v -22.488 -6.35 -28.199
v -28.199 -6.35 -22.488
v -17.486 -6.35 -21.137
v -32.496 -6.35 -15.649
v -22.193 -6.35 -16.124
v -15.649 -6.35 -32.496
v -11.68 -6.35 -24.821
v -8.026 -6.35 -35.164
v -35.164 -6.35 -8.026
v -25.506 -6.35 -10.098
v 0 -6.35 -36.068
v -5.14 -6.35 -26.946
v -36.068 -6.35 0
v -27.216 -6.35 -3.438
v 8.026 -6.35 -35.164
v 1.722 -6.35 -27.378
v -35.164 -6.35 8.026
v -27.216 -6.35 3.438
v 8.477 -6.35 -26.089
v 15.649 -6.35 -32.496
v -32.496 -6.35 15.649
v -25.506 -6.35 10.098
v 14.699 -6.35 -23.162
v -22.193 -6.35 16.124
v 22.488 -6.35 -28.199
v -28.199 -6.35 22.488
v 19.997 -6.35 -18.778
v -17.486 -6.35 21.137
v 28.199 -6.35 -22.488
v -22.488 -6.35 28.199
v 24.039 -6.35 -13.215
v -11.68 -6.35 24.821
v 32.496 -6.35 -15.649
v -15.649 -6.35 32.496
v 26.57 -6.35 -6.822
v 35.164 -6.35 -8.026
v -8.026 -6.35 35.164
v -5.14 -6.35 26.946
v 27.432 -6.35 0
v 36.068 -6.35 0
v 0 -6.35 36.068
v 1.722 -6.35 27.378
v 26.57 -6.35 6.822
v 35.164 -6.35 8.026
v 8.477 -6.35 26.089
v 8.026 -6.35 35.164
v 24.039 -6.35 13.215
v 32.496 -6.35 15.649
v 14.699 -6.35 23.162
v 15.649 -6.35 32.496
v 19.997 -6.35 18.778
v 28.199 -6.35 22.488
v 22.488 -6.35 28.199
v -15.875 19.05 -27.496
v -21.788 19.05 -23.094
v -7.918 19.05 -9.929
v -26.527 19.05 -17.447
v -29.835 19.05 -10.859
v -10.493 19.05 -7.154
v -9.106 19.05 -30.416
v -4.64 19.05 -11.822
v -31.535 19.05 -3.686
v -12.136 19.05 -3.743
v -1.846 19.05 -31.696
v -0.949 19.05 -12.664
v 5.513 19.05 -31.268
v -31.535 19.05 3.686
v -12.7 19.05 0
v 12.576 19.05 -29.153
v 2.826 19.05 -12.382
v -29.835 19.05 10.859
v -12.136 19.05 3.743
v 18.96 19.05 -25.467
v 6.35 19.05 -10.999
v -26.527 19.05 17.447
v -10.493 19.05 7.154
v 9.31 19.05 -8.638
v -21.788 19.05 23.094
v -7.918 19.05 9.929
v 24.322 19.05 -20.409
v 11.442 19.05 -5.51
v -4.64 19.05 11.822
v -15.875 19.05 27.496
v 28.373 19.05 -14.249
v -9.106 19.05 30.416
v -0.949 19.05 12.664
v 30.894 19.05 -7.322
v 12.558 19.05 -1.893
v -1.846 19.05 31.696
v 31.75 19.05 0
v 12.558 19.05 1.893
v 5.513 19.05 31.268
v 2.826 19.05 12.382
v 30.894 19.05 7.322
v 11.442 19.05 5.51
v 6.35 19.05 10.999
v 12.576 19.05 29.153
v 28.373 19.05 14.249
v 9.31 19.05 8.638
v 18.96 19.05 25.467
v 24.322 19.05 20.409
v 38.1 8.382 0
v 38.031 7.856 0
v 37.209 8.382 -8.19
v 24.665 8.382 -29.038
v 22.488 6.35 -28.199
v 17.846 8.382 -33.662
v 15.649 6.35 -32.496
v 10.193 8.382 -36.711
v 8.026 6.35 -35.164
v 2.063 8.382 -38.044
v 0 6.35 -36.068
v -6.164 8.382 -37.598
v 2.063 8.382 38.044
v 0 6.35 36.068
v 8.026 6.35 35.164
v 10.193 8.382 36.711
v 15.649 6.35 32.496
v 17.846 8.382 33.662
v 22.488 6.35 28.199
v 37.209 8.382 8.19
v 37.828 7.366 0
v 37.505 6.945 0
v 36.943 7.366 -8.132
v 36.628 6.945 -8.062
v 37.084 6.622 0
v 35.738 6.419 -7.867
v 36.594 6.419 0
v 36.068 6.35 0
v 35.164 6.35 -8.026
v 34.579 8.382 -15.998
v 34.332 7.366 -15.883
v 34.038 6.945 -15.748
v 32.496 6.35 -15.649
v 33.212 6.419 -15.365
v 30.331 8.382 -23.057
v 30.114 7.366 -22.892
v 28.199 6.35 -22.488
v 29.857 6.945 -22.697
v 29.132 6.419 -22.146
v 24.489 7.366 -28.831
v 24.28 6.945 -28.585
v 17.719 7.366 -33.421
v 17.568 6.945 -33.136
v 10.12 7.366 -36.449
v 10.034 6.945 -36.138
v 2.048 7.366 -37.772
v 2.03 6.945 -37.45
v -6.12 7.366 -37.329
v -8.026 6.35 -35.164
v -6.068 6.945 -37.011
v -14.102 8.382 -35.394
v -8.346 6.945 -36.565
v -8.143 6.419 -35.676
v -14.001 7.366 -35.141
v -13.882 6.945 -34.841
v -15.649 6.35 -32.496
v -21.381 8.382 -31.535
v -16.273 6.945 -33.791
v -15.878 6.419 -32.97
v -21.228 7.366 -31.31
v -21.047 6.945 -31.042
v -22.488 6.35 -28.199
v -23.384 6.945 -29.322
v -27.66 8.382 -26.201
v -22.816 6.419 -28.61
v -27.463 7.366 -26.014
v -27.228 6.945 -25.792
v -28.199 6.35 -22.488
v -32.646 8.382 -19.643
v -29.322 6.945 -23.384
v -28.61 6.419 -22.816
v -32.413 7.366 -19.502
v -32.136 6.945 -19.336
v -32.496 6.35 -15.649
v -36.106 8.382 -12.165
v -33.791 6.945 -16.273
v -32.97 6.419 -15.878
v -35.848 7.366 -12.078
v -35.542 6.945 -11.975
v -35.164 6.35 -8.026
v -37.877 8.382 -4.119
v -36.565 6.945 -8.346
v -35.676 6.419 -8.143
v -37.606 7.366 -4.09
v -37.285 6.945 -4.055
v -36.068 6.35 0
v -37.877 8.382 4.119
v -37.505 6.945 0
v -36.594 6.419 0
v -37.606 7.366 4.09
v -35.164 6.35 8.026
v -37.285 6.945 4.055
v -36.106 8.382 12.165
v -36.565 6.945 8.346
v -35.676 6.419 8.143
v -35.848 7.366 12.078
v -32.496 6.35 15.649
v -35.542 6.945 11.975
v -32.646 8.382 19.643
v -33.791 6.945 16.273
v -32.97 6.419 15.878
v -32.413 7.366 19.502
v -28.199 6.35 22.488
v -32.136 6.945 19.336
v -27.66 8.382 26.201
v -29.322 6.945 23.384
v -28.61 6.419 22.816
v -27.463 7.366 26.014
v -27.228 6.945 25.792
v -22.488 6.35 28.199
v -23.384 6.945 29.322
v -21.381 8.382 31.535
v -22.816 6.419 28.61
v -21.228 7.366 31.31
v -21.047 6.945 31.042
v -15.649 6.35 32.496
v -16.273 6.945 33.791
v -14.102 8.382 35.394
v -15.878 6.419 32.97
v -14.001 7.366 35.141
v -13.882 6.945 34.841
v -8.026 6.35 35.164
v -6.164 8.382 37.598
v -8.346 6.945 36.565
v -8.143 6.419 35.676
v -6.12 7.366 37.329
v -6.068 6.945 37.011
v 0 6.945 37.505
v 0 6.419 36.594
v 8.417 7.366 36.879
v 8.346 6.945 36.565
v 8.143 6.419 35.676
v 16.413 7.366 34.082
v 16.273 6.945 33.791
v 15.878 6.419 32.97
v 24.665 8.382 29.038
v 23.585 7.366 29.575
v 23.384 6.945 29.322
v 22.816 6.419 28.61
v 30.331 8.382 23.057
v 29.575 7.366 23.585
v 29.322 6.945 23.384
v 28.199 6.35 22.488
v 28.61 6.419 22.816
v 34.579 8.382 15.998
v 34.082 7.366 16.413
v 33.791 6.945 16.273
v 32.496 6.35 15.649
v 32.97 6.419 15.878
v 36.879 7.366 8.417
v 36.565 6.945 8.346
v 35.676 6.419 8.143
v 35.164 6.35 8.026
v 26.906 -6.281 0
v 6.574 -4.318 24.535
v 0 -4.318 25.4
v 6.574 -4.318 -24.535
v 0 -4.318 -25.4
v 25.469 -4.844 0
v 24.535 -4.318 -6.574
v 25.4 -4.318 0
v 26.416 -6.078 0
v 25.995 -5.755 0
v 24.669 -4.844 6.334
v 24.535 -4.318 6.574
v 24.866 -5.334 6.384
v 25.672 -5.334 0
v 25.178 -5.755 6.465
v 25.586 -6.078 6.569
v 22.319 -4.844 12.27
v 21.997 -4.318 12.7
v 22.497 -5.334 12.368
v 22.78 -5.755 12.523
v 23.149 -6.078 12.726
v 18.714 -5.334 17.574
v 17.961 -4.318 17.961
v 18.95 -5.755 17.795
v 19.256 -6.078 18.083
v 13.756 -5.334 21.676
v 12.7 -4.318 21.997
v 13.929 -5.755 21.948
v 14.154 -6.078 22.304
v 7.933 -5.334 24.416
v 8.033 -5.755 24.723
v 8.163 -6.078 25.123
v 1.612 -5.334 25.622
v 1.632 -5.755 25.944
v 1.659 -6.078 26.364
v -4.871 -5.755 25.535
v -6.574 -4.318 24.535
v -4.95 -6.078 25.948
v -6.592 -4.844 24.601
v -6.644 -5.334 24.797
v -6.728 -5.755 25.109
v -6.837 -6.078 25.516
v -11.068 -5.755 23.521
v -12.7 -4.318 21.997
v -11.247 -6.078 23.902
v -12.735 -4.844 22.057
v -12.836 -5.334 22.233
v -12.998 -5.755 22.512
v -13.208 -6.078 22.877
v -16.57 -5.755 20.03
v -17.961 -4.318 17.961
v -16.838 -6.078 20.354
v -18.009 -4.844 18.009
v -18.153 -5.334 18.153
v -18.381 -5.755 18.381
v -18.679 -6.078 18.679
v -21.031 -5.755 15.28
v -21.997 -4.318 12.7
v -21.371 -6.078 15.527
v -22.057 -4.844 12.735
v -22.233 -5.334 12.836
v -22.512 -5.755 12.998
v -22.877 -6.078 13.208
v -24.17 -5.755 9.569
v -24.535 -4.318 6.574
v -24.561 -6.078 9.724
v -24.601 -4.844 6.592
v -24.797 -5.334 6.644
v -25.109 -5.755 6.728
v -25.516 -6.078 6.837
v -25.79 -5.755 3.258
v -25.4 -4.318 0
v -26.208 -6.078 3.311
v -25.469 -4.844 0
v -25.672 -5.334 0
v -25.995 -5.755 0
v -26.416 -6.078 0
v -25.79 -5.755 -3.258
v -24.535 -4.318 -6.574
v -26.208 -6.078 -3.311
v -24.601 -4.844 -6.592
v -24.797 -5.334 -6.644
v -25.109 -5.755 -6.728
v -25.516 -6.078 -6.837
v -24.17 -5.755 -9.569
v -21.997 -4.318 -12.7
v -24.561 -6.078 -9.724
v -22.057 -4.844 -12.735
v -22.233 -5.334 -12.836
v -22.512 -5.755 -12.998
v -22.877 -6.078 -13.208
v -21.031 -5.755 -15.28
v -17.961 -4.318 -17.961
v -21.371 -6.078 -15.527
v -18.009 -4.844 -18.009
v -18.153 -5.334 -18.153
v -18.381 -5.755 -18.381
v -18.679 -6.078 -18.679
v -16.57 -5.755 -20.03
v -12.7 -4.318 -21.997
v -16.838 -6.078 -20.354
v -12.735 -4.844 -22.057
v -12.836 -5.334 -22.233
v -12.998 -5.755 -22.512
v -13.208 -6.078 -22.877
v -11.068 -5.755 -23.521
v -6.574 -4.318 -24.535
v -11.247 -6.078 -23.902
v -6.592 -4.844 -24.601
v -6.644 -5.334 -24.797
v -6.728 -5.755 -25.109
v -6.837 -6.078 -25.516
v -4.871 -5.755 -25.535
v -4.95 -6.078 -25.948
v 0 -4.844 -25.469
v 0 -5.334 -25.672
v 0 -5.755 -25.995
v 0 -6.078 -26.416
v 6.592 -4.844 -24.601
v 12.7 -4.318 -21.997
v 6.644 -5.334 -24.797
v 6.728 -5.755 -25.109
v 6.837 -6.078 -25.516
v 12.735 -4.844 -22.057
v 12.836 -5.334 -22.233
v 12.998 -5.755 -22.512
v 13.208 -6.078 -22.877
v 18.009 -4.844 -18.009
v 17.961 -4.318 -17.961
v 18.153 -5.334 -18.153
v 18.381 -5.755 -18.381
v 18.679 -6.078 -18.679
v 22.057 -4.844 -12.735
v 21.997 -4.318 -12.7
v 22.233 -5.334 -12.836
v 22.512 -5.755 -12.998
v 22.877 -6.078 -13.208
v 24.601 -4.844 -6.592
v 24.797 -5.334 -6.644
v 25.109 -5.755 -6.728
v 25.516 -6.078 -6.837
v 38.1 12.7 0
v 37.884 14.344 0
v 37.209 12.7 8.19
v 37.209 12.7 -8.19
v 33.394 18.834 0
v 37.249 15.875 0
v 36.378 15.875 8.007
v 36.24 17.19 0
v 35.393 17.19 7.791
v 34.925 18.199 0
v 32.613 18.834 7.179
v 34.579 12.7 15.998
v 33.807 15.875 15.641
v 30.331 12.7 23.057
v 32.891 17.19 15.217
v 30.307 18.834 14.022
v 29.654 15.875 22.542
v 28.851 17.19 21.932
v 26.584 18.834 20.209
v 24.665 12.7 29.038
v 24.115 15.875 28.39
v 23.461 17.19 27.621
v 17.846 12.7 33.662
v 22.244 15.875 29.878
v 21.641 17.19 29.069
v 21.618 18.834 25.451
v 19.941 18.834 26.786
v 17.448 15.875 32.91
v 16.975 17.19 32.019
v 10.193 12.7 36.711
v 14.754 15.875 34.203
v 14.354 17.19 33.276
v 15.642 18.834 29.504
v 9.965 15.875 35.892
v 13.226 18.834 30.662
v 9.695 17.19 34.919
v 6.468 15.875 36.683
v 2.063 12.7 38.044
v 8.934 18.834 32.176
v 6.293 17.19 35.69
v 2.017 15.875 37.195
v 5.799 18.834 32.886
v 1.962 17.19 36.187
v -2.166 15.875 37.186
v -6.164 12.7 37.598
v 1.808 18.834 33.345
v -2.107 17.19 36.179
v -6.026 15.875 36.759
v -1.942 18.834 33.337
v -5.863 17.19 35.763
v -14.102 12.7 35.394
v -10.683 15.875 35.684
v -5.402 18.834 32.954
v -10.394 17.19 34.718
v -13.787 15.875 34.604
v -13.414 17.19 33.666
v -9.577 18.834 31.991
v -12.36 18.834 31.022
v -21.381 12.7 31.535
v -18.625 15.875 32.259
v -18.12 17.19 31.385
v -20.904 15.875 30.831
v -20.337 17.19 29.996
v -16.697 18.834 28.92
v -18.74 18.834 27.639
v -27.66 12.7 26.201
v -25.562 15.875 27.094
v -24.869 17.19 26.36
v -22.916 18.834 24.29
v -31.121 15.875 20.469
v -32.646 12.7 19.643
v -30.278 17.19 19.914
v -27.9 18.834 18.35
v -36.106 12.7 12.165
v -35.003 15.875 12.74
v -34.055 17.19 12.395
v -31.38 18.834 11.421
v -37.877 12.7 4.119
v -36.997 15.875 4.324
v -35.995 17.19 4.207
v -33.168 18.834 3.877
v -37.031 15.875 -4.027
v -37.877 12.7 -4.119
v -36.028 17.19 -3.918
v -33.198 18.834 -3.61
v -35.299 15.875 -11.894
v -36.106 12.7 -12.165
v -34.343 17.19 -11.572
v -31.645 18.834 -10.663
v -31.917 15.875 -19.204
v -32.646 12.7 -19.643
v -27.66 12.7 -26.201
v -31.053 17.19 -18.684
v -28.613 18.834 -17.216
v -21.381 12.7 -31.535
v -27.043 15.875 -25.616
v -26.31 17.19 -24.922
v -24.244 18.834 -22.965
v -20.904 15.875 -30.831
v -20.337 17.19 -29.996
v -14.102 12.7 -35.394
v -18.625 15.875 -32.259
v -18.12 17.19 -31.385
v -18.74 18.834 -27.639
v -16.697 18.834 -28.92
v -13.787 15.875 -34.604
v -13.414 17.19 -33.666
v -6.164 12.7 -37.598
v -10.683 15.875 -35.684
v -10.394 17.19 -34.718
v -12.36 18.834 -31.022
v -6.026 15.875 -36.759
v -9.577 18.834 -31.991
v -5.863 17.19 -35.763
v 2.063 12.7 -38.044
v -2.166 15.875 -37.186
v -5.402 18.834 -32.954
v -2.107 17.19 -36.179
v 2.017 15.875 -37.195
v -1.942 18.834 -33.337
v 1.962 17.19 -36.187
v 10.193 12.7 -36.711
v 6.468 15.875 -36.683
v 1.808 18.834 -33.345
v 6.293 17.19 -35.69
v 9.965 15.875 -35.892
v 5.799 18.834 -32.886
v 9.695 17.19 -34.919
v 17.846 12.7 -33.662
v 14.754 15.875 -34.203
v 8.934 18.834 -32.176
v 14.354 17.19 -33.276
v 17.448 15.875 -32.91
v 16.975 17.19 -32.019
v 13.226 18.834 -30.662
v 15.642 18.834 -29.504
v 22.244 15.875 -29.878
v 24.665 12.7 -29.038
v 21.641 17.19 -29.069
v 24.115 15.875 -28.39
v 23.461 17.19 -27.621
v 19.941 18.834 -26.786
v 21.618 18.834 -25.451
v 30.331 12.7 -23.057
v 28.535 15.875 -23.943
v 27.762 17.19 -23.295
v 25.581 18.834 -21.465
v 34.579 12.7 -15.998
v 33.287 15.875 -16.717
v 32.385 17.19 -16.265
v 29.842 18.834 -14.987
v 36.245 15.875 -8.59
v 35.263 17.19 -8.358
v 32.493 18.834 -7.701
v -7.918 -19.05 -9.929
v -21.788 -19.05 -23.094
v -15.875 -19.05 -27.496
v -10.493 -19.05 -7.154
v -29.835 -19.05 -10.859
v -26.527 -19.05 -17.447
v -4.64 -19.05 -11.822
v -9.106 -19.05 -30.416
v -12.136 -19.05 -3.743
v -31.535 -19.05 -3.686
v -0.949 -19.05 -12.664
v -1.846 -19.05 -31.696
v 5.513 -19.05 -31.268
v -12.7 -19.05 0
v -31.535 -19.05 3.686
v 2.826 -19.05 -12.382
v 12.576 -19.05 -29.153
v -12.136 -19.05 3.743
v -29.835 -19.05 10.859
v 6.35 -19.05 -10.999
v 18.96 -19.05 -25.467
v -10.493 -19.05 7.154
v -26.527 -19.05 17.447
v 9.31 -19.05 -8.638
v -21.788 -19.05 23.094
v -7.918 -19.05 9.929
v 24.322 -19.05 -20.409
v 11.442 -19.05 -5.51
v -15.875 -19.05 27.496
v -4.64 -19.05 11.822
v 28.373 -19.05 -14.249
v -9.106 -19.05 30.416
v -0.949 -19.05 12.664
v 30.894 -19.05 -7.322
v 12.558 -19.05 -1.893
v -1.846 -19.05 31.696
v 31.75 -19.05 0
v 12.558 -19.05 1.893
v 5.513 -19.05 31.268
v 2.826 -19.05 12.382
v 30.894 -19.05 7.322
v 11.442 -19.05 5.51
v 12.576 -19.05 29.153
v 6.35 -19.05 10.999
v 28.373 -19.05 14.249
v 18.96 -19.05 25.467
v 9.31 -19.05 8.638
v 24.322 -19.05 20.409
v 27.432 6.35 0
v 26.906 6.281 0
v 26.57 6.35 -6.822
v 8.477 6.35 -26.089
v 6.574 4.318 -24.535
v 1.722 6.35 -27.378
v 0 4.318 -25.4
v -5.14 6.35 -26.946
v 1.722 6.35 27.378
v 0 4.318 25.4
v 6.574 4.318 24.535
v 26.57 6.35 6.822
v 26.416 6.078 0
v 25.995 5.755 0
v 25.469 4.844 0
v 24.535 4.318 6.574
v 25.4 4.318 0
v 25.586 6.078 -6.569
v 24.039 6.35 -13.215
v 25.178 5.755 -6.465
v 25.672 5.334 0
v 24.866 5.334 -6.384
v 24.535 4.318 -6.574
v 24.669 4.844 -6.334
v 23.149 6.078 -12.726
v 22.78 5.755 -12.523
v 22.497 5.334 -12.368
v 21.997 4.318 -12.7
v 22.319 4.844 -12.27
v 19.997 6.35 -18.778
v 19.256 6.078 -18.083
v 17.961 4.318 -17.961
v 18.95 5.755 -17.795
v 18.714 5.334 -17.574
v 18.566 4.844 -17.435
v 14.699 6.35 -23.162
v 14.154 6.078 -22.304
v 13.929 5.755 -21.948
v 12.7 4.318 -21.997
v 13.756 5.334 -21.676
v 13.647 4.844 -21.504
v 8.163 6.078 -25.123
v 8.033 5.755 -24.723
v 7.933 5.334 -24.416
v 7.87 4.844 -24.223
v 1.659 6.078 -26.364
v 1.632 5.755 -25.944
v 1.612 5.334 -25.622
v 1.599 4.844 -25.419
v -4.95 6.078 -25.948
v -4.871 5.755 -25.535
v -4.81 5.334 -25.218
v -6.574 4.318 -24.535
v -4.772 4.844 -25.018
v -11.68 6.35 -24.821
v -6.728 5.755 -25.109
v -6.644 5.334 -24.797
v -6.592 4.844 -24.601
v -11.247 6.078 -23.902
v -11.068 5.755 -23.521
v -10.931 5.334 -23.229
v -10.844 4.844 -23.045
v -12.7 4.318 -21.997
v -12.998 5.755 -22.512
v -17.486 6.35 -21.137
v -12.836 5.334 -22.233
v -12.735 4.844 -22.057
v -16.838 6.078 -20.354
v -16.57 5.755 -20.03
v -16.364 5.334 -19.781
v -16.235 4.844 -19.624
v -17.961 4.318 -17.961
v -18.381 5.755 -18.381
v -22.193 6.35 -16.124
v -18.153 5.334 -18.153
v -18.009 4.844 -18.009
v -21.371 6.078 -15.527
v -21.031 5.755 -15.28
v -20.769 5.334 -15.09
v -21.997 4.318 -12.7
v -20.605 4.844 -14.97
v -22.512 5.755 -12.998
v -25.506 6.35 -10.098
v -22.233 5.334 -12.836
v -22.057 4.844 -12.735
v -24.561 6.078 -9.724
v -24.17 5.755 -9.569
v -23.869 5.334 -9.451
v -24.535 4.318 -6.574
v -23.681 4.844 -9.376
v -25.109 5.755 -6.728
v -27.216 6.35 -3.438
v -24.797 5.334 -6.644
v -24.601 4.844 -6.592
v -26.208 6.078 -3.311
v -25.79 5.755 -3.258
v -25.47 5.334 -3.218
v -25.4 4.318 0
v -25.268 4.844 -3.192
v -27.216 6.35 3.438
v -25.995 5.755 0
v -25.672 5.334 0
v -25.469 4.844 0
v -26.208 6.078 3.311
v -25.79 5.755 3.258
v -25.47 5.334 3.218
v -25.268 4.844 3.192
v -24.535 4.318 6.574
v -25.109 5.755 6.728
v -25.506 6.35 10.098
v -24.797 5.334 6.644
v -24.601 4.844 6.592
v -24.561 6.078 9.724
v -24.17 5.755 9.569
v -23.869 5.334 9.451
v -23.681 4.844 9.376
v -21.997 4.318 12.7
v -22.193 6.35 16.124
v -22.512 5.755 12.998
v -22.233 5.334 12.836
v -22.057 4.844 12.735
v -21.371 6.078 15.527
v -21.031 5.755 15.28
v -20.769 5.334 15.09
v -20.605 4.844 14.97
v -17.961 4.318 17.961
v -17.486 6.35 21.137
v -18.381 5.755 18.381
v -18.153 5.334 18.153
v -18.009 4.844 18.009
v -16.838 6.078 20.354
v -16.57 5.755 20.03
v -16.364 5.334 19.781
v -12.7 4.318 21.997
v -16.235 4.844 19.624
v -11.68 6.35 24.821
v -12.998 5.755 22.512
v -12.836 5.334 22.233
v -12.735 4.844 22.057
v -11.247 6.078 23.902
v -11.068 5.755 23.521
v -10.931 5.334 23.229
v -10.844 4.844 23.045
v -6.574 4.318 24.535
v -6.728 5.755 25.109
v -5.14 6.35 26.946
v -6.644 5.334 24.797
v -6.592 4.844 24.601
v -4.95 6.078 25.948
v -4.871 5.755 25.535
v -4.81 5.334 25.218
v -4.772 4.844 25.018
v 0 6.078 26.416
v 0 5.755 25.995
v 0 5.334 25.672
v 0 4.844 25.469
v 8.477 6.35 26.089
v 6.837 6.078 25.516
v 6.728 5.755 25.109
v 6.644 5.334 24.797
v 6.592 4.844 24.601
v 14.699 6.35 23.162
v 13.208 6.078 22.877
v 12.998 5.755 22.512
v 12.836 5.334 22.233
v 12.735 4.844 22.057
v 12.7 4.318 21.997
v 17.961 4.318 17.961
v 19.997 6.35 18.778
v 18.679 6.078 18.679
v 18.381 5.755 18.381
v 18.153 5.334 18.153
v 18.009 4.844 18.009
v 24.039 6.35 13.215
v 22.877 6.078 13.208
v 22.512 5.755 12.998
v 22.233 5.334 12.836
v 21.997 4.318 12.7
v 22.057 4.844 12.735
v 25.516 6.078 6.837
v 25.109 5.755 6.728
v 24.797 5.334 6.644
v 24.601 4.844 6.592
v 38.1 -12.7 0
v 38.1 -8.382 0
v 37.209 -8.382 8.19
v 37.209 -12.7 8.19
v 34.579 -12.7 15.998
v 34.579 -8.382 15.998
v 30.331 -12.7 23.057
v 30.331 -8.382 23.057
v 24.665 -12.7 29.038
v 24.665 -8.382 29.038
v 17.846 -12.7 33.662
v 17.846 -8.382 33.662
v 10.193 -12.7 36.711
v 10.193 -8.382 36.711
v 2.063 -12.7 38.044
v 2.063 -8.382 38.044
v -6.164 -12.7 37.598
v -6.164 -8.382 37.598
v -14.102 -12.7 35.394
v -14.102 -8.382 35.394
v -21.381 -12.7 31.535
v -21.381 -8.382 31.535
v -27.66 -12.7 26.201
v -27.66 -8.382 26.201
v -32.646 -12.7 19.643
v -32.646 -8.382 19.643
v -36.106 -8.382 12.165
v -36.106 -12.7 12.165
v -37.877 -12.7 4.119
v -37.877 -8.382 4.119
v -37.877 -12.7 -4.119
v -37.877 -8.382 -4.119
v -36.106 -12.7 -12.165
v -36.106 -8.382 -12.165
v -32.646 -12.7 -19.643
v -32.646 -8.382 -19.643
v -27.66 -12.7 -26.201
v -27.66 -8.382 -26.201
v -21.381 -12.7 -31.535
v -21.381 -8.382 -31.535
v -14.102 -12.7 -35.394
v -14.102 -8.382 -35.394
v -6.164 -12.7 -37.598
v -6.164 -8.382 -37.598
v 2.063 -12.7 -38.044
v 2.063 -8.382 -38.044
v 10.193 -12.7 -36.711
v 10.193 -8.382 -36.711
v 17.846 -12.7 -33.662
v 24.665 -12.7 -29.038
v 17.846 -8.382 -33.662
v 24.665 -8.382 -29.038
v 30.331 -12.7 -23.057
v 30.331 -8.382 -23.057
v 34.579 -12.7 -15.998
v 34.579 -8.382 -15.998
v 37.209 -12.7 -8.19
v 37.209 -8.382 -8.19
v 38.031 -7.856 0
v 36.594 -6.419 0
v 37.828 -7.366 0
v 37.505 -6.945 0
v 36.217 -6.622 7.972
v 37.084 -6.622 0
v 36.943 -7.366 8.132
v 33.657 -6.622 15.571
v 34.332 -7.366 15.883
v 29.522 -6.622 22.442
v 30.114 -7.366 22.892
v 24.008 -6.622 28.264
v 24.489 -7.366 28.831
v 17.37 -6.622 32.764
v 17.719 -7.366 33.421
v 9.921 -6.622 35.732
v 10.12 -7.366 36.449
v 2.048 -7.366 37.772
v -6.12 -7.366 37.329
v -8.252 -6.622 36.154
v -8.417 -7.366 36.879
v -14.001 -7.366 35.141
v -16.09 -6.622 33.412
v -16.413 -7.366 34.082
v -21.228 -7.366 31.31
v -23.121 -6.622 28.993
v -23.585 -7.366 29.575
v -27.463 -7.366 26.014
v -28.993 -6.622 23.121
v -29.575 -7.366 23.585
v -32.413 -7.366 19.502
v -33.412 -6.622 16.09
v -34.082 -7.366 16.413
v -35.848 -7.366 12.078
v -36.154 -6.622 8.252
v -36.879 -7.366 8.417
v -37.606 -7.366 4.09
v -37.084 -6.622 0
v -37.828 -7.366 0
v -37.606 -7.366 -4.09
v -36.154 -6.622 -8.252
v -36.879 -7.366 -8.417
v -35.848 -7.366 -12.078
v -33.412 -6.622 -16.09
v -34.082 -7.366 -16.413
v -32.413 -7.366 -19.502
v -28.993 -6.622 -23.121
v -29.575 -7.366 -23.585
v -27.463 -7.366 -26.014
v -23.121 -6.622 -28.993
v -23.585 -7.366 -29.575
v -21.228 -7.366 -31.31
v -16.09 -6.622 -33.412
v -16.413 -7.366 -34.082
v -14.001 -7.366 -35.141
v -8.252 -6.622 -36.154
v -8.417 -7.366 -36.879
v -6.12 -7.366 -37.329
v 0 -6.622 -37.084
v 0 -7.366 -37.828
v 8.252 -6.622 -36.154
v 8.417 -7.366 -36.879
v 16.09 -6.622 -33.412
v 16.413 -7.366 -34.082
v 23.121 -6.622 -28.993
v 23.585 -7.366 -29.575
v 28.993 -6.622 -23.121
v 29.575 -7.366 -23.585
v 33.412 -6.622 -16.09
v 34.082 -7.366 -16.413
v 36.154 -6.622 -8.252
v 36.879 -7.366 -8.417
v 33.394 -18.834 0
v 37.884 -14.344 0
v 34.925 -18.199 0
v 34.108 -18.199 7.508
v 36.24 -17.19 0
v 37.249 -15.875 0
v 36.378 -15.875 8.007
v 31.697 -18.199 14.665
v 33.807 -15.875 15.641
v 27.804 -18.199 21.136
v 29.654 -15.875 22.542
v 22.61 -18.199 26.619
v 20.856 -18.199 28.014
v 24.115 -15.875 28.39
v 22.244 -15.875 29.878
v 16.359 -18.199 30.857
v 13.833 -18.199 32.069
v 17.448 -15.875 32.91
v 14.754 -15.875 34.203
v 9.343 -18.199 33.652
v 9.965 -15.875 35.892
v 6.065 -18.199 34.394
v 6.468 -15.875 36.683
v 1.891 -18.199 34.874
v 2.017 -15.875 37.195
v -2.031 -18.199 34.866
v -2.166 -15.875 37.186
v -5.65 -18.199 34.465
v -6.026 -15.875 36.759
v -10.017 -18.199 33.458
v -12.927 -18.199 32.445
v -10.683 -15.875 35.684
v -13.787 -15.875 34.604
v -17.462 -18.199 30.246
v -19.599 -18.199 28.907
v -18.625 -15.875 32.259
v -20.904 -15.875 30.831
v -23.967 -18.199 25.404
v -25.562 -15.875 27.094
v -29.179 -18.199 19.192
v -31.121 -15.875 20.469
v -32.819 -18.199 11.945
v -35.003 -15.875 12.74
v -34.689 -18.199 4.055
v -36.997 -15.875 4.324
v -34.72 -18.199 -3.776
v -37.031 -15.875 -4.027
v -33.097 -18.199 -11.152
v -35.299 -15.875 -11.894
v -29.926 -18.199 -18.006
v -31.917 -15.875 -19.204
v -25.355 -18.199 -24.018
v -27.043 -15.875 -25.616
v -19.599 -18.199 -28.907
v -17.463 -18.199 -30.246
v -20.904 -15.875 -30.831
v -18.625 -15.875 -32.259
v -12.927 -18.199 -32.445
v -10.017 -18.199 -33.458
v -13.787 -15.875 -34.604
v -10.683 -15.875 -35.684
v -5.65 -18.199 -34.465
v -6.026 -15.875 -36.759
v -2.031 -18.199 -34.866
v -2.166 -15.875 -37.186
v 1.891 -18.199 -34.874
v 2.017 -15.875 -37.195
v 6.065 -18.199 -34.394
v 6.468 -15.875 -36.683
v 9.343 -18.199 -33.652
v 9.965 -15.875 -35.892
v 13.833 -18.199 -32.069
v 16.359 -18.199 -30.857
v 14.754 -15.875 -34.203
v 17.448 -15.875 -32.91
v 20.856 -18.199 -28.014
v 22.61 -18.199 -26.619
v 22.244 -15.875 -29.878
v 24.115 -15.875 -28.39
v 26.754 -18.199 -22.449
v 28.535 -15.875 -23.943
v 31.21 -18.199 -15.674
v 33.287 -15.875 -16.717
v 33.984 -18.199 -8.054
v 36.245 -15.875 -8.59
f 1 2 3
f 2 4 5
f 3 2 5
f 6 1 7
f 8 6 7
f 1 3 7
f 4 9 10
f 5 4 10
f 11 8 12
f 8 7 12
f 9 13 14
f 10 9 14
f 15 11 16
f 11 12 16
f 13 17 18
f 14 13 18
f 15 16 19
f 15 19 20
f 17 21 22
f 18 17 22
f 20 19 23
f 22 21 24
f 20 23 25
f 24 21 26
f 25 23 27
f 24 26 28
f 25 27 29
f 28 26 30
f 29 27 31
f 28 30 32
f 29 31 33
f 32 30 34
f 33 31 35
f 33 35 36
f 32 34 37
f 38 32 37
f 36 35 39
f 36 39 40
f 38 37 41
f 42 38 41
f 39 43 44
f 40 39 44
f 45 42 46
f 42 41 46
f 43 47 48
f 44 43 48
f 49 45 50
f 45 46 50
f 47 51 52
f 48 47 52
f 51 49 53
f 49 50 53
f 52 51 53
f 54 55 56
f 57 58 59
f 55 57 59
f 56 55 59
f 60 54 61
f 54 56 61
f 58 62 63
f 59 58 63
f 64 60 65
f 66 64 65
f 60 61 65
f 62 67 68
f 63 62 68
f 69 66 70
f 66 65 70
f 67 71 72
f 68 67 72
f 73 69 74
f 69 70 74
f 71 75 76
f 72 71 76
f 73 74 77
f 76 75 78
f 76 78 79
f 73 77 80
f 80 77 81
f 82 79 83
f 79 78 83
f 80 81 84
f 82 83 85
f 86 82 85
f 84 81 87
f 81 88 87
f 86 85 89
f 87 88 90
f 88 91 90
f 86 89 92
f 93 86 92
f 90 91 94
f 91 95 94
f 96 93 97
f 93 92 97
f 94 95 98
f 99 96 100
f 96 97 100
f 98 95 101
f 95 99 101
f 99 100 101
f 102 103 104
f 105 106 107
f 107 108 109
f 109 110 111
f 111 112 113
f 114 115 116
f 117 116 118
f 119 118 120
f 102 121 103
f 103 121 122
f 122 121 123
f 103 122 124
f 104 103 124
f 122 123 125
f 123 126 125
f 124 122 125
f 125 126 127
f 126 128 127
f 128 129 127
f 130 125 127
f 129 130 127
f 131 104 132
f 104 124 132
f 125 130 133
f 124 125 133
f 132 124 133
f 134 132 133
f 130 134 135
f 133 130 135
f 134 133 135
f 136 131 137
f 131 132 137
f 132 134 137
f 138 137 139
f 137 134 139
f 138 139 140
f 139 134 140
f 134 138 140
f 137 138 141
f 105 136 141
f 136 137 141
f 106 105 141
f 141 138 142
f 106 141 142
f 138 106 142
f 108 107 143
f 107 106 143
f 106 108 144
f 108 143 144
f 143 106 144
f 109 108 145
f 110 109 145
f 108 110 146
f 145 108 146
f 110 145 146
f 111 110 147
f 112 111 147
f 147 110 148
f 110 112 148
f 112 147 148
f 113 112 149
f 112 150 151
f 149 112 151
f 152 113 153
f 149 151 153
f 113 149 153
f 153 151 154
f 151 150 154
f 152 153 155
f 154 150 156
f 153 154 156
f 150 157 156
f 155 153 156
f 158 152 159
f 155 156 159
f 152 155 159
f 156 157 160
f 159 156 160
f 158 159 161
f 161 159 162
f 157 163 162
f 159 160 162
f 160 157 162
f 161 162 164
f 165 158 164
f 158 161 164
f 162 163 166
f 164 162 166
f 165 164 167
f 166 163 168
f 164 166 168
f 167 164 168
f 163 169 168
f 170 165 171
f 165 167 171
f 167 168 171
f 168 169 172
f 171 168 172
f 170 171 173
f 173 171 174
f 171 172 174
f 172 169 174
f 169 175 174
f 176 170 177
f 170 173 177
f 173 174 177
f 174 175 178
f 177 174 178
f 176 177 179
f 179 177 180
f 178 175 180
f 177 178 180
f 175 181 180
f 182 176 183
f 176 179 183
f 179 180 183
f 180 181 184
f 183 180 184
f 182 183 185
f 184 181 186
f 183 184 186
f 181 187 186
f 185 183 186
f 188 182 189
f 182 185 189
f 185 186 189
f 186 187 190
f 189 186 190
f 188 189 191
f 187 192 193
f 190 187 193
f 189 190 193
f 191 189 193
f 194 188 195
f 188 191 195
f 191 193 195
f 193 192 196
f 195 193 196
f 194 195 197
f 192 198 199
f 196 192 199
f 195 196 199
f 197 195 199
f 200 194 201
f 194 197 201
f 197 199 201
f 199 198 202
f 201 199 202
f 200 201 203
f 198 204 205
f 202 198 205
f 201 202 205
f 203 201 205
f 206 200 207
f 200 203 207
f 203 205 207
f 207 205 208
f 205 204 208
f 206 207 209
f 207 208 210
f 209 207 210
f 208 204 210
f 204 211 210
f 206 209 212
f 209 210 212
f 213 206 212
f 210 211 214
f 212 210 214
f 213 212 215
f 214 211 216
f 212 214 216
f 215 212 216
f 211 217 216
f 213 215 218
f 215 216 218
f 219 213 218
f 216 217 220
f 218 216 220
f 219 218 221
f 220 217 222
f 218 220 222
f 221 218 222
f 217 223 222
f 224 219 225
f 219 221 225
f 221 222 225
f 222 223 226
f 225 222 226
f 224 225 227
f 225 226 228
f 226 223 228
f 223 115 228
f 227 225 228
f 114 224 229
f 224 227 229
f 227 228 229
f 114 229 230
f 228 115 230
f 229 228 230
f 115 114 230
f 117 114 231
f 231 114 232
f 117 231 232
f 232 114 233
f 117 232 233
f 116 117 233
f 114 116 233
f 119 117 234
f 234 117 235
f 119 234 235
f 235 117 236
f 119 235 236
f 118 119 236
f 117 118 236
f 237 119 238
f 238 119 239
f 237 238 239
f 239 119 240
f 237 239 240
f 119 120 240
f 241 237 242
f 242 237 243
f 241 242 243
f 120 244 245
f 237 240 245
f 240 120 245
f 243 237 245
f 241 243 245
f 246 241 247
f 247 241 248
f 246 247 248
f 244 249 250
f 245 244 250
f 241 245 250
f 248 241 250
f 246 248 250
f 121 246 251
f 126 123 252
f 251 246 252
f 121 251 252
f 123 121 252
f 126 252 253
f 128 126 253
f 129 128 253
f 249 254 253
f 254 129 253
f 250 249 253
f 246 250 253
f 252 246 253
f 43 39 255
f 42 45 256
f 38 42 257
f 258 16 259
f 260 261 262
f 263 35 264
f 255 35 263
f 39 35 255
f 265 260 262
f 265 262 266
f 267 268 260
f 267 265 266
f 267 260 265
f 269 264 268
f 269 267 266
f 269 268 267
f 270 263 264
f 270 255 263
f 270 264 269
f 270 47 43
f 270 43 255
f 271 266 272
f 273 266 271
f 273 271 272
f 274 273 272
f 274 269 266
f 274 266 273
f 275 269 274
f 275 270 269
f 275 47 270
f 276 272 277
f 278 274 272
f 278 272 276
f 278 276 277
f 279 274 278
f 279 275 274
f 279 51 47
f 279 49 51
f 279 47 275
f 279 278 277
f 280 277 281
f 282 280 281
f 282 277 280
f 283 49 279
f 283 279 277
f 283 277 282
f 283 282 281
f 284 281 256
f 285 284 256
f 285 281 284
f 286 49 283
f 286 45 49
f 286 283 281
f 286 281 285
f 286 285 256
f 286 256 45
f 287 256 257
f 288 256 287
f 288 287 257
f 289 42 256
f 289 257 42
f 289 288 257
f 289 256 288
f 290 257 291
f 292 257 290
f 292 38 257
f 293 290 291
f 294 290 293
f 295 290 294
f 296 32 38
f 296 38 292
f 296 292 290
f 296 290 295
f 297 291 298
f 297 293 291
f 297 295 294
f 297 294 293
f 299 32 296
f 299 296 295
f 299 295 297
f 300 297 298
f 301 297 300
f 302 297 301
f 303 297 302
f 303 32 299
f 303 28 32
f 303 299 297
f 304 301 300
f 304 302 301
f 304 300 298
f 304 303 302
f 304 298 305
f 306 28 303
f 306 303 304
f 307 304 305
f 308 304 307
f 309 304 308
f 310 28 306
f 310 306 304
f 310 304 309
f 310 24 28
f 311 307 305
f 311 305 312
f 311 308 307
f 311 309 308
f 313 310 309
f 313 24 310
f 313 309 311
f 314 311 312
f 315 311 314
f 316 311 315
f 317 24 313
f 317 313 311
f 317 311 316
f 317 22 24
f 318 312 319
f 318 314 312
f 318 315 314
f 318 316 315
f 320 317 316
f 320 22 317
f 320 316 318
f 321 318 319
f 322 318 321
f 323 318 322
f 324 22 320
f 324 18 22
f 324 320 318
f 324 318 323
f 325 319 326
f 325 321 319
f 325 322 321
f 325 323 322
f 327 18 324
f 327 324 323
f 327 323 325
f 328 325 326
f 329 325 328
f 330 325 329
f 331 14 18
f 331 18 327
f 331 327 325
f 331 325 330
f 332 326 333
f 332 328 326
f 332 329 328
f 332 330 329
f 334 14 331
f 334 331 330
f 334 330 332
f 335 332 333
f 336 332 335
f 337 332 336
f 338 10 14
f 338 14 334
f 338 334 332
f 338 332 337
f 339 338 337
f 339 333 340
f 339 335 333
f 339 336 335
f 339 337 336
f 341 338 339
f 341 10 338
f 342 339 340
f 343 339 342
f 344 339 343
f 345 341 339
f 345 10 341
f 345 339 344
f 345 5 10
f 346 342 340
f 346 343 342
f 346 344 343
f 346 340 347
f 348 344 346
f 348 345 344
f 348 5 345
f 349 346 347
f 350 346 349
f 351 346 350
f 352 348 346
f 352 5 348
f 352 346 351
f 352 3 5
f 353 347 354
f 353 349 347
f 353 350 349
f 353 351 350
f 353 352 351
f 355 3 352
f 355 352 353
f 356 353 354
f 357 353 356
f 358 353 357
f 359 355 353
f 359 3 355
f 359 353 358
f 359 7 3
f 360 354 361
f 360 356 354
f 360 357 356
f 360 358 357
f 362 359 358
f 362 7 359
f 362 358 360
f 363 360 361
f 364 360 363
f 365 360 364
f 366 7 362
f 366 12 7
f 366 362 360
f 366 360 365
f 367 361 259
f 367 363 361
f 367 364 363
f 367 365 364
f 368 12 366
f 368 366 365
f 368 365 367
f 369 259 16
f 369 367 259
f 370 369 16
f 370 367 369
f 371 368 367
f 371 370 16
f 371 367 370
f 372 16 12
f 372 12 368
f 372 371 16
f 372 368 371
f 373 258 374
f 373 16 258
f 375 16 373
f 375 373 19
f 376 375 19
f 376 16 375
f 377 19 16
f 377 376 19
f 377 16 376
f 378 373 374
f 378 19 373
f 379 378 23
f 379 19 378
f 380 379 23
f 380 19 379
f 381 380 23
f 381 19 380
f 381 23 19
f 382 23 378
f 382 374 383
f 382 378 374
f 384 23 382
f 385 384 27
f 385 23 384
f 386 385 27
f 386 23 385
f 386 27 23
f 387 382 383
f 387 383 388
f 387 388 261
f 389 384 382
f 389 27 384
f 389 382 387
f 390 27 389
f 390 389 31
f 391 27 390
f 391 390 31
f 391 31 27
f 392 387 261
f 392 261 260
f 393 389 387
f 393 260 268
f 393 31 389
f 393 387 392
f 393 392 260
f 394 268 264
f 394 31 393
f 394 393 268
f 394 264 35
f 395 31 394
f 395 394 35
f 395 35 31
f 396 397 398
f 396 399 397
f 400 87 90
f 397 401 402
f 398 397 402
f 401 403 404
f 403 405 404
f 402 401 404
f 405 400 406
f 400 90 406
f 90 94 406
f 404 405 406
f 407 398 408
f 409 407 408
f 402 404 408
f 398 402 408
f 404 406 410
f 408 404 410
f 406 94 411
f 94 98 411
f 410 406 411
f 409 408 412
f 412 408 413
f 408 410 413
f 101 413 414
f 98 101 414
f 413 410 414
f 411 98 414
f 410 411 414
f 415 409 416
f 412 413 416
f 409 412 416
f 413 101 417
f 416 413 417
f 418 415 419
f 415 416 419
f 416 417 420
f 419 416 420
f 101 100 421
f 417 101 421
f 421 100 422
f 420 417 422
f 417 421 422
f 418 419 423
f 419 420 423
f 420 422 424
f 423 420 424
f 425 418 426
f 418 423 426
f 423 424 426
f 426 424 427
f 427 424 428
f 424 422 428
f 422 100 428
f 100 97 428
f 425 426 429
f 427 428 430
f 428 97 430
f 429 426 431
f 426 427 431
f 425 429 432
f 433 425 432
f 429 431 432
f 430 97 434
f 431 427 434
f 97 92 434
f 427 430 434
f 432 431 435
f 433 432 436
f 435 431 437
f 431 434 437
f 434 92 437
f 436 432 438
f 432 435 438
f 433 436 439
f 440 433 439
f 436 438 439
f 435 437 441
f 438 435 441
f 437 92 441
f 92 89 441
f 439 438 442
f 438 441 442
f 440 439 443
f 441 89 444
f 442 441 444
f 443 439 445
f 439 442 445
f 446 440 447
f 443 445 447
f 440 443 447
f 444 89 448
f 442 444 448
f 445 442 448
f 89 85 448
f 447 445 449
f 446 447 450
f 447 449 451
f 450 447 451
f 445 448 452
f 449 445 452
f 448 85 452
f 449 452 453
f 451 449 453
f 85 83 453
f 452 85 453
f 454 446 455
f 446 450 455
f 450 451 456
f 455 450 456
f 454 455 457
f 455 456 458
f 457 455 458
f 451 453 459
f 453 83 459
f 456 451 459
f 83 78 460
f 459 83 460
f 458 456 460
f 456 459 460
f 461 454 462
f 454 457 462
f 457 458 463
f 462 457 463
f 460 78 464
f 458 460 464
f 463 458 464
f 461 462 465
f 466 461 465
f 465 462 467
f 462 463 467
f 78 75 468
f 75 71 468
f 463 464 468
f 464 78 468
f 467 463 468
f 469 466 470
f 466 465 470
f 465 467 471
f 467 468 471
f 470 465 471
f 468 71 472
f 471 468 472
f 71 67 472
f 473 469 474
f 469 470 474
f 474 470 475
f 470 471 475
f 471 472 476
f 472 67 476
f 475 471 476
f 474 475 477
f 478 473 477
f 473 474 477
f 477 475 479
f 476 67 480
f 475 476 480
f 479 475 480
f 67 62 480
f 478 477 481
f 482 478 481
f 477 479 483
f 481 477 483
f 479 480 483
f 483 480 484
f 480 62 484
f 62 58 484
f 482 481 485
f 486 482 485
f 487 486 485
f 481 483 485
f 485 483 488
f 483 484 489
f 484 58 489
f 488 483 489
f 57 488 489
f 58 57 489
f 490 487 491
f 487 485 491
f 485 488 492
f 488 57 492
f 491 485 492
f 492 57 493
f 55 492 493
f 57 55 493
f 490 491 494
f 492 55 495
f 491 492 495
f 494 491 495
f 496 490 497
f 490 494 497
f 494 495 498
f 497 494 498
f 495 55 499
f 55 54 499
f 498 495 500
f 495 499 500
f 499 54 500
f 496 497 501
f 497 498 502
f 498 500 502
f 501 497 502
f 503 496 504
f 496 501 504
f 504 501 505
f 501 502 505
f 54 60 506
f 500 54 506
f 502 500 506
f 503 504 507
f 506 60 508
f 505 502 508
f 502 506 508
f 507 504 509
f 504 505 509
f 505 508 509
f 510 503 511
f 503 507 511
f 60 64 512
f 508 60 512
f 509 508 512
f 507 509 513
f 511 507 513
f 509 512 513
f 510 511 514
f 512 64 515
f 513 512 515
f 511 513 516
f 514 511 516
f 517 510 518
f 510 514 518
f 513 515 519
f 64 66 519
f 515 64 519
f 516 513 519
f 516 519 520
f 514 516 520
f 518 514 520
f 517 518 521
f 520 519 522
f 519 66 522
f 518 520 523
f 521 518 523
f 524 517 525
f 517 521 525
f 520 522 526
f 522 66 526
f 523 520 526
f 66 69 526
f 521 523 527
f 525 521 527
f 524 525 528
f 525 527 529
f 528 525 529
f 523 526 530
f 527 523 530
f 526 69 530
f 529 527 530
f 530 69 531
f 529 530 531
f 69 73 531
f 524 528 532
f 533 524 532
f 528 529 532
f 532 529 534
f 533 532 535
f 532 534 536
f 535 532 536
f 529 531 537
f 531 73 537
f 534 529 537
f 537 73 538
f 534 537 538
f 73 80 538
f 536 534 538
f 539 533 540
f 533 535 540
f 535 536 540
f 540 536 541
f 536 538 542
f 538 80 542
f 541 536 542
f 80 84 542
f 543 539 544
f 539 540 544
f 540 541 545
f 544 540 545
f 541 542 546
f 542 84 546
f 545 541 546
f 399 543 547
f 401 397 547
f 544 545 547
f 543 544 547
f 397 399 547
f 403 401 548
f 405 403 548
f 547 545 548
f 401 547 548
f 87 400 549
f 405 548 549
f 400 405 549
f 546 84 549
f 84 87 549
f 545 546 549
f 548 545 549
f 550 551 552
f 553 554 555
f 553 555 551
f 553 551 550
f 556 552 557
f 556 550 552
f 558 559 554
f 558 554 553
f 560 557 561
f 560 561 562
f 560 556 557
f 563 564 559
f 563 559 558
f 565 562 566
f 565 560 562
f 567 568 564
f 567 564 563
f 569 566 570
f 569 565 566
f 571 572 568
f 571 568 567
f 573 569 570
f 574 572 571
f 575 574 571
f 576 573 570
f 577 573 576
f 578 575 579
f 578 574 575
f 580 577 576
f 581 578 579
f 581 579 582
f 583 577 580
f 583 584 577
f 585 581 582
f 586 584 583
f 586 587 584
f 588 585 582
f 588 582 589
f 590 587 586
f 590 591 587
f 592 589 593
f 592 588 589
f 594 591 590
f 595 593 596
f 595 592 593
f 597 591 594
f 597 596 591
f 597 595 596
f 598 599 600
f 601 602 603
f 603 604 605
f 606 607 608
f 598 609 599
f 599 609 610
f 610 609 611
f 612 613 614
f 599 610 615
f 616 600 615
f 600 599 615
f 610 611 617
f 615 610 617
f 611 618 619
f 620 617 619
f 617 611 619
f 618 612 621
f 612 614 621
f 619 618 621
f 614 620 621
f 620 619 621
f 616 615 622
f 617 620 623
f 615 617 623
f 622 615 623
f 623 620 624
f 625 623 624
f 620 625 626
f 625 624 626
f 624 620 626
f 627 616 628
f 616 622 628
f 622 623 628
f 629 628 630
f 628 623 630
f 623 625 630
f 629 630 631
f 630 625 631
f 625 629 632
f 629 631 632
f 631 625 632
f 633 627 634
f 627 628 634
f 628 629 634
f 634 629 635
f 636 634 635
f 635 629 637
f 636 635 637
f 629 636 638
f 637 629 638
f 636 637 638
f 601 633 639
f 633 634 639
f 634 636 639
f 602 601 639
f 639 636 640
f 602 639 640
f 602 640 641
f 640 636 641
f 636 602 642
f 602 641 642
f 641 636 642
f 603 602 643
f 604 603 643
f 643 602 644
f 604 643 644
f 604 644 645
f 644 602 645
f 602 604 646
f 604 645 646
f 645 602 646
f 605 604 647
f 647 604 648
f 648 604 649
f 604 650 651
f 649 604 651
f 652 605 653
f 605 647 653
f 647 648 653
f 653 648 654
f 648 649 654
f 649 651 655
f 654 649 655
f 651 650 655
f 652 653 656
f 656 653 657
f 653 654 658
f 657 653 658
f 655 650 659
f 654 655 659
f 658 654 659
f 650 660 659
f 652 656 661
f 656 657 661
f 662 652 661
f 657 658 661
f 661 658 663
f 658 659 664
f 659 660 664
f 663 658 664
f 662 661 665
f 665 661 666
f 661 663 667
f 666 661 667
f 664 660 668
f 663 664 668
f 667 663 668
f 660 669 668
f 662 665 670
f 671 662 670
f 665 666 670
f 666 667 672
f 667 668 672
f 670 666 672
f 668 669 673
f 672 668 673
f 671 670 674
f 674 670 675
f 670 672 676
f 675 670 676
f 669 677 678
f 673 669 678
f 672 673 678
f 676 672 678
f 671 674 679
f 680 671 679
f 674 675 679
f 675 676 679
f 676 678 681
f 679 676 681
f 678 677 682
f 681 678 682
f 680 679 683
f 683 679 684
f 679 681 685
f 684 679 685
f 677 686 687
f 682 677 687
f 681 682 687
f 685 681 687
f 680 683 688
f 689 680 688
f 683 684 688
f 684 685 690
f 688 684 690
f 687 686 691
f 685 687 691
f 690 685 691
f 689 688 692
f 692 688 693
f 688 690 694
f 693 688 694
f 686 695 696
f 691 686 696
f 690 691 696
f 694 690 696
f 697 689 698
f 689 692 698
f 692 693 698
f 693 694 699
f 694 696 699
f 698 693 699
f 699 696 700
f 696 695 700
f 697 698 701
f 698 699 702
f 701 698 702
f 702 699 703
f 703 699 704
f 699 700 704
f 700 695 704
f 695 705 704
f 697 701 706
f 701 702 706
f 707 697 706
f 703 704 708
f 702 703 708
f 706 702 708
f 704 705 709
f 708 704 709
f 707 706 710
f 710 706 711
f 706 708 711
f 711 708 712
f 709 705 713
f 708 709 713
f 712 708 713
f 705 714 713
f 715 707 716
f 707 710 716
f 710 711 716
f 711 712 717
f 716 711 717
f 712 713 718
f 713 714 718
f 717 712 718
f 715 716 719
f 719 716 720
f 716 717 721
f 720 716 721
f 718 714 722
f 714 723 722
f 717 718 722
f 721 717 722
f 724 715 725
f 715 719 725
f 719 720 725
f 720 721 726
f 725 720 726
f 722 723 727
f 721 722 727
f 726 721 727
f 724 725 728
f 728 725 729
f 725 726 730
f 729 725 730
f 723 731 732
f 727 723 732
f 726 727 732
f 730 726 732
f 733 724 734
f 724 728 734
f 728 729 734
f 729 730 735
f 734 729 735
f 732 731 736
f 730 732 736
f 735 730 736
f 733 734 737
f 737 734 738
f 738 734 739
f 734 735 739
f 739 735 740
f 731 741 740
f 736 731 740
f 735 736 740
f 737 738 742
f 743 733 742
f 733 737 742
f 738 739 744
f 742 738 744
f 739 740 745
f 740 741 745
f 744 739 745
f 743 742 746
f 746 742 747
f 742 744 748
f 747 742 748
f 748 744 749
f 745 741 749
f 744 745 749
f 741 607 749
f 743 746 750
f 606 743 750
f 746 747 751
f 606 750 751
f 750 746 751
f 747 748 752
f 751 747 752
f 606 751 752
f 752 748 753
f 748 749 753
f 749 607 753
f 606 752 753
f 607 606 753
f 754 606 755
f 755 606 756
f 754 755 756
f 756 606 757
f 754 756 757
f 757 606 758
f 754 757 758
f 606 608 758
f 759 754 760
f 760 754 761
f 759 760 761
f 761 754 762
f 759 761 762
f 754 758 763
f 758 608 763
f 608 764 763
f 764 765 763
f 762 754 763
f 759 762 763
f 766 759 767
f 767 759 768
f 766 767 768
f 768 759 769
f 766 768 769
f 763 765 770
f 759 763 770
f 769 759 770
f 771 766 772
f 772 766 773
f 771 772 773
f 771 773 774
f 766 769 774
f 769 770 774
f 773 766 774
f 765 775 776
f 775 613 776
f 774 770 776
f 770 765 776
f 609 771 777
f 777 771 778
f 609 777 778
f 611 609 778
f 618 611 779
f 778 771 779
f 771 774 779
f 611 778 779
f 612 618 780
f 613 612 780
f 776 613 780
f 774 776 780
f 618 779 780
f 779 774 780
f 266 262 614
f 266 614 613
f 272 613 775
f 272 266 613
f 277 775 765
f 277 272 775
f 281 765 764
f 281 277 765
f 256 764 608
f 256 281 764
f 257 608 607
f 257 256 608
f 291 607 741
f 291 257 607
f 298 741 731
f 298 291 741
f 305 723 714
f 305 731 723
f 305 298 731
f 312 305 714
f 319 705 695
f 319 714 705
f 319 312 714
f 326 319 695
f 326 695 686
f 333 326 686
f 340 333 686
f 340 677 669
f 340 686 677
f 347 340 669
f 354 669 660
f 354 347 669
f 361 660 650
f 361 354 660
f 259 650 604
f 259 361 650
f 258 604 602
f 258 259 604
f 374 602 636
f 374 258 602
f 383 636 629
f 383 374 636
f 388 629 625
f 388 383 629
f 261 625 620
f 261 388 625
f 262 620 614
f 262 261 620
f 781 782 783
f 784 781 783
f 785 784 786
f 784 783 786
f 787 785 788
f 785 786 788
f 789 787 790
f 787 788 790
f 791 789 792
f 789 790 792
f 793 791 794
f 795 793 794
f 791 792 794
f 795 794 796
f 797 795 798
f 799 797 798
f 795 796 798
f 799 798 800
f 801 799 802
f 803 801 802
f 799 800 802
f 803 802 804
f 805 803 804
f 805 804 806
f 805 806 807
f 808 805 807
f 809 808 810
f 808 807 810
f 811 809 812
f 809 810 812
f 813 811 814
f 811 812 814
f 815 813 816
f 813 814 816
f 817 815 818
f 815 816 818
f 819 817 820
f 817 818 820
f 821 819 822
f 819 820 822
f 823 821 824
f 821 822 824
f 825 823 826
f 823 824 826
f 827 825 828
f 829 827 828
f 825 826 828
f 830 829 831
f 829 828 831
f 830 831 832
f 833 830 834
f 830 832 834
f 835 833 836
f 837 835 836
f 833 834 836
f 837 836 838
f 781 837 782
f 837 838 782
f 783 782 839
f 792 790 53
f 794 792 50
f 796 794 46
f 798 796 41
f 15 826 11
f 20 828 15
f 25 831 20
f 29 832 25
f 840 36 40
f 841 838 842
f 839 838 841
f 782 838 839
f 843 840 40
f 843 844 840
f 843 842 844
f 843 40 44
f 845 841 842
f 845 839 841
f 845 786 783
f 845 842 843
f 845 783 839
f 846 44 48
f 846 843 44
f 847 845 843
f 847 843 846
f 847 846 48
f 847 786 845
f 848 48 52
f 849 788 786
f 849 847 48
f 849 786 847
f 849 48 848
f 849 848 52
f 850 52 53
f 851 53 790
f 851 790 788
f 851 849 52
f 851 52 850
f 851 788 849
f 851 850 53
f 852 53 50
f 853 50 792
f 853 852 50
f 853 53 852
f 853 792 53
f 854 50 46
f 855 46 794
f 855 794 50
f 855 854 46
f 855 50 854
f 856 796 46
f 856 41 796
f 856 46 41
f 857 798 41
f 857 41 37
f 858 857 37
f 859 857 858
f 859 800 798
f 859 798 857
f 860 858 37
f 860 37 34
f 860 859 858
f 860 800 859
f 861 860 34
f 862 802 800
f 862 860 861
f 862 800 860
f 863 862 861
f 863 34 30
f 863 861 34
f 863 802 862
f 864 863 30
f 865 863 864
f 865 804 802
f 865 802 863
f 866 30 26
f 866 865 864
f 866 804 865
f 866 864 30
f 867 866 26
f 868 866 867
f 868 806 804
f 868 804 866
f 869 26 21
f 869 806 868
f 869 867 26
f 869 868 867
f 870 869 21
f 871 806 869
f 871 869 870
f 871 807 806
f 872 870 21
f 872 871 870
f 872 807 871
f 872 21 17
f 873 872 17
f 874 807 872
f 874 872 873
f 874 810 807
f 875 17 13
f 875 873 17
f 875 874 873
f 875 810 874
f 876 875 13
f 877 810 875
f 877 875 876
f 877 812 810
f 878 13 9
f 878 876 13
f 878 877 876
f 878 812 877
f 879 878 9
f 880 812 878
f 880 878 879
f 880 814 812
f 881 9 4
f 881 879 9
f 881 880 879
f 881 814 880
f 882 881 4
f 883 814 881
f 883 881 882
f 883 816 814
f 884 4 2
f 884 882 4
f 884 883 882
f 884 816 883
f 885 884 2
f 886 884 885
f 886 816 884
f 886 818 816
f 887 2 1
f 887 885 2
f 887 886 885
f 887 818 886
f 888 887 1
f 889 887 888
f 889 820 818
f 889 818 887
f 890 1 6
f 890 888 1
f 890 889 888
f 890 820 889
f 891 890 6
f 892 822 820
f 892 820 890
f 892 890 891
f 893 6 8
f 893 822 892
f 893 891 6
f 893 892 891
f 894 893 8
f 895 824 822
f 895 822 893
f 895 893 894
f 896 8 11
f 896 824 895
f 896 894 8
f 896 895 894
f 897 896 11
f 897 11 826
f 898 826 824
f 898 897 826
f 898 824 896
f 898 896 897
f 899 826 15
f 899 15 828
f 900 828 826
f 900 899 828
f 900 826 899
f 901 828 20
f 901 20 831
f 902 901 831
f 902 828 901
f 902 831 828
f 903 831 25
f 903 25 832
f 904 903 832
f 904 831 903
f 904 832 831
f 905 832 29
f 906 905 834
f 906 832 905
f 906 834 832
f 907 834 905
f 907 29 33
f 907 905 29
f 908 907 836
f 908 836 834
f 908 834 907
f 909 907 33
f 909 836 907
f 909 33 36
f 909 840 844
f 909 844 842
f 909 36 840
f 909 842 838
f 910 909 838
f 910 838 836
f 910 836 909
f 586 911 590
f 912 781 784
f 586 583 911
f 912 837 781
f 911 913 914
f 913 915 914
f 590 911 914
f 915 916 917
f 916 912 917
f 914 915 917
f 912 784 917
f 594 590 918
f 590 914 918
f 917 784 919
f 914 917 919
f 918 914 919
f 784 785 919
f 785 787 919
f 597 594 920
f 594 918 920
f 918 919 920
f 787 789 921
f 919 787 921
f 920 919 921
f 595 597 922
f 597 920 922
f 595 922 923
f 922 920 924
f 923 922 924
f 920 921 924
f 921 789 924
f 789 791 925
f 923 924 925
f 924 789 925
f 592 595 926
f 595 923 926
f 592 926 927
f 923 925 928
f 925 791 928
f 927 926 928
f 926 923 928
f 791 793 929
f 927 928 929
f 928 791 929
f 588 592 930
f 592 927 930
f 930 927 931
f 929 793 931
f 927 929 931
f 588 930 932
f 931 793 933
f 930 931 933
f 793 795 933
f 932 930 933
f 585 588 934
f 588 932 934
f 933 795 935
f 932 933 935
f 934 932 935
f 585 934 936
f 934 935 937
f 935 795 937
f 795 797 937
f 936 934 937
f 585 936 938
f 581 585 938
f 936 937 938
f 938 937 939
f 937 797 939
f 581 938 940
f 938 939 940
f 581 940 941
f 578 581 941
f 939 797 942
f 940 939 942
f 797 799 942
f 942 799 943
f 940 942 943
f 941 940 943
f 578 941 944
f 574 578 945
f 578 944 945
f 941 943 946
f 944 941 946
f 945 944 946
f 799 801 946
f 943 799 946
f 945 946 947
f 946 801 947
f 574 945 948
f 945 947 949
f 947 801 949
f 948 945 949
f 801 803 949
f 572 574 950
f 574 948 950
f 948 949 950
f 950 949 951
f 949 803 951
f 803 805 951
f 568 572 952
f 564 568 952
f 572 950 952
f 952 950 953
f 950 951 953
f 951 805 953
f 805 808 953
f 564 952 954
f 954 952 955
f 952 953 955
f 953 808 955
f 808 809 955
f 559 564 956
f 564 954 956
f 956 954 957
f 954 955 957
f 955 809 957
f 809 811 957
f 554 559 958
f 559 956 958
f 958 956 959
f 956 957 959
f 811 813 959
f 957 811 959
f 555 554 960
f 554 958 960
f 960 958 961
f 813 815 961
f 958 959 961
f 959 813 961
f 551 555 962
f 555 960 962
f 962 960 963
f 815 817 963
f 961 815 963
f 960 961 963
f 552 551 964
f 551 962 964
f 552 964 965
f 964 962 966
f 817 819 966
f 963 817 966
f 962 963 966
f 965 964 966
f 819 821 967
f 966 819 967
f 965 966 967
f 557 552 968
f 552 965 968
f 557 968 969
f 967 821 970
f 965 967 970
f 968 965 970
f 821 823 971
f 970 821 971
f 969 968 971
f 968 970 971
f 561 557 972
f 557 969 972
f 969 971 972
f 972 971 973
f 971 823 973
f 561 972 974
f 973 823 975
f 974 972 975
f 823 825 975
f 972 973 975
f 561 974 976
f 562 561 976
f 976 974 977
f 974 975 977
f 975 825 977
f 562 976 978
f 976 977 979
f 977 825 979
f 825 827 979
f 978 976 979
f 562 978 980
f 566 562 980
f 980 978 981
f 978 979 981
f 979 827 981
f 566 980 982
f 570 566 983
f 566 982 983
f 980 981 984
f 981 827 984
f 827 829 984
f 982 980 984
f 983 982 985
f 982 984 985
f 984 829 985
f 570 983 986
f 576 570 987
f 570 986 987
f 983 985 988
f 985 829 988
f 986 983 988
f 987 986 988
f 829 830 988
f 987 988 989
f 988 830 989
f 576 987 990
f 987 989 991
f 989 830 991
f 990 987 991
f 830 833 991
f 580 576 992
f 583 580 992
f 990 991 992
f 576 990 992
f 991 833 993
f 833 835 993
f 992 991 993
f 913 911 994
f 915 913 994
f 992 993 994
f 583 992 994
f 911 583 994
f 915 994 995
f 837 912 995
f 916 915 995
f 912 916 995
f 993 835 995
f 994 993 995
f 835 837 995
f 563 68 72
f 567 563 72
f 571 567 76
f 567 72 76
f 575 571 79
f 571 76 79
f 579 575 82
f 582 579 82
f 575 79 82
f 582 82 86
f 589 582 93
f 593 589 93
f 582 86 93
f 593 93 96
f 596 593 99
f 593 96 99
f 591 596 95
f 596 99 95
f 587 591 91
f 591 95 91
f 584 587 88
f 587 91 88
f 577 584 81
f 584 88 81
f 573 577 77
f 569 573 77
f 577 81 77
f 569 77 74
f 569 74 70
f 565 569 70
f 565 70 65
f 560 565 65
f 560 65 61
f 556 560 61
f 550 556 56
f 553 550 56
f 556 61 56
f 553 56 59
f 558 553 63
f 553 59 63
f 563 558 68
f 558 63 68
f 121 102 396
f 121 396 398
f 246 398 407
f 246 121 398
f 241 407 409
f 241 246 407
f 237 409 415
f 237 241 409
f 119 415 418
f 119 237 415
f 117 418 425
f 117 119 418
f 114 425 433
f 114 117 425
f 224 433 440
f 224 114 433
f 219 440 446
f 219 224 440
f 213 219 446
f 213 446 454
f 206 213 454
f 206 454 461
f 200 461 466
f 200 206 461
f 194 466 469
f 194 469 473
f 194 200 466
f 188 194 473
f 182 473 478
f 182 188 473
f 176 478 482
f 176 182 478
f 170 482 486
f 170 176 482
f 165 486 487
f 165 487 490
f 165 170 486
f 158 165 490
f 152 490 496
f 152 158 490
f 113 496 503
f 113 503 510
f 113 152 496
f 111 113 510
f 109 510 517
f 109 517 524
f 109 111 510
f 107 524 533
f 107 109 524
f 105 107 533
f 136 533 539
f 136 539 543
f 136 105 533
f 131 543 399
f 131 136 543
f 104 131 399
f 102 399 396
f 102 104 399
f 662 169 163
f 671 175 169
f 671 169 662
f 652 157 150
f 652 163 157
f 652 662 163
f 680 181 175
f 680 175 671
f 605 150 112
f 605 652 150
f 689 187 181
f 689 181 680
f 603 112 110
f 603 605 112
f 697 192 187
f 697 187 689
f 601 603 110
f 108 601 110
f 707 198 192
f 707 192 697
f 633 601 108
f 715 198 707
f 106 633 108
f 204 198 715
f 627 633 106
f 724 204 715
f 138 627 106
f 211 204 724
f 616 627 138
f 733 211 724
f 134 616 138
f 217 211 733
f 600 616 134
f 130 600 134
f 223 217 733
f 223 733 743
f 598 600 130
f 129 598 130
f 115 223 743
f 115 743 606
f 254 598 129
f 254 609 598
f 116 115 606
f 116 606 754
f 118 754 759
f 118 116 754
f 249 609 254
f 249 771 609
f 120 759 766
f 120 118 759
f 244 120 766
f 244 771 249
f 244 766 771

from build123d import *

# Parameters (mm, degrees)
F0_R     = 25.4
F1_DEPTH = 6.35
F2_R     = 38.1
F2_R_2   = 25.4
F3_DEPTH = 12.7
F4_R     = 38.1
F4_R_2   = 25.4
F5_DEPTH = 12.7
F6_R     = 12.7
F7_DEPTH = 38.1
F8_R     = 6.35
F9_R     = 2.032


# Not quite as in the source:
# - a pattern or mirror of a feature is missing from the dataset's text; its kind, count and spacing are read off the source's solid


with BuildPart() as f1:
    # F0 (on Front) → F1 (new body, symmetric)
    with BuildSketch(Plane.XZ):
        Circle(F0_R)
    extrude(amount=F1_DEPTH, both=True)

    # F2 (on face) → F3 (join)
    with BuildSketch(Plane.XZ.offset(6.35)):
        Circle(F2_R)
        Circle(F2_R_2, mode=Mode.SUBTRACT)
        Circle(F2_R_2)
    f3 = extrude(amount=F3_DEPTH)

    # F3_copies: F3 across plane
    add(f3.mirror(Plane.ZX))

    # F4 (on face) → F5 (join)
    with BuildSketch(Plane(origin=(0, 6.35, 0), x_dir=(-1, 0, 0), z_dir=(0, 1, 0))):
        Circle(F4_R)
        Circle(F4_R_2, mode=Mode.SUBTRACT)
    extrude(amount=F5_DEPTH)

    # F6 (on face) → F7 (cut)
    with BuildSketch(Plane(origin=(0, 19.05, 0), x_dir=(-1, 0, 0), z_dir=(0, 1, 0))):
        Circle(F6_R)
    extrude(amount=-F7_DEPTH, mode=Mode.SUBTRACT)

    # F8
    f8_edges = [f1.edges().sort_by_distance(p)[0] for p in [
        (-38.1, 19.05, 0),
        (-38.1, -19.05, 0),
    ]]
    fillet(f8_edges, radius=F8_R)

    # F9
    f9_edges = [f1.edges().sort_by_distance(p)[0] for p in [
        (-25.4, 6.35, 0),
        (-38.1, 6.35, 0),
        (-38.1, -6.35, 0),
        (-25.4, -6.35, 0),
    ]]
    fillet(f9_edges, radius=F9_R)


solid = f1.part
